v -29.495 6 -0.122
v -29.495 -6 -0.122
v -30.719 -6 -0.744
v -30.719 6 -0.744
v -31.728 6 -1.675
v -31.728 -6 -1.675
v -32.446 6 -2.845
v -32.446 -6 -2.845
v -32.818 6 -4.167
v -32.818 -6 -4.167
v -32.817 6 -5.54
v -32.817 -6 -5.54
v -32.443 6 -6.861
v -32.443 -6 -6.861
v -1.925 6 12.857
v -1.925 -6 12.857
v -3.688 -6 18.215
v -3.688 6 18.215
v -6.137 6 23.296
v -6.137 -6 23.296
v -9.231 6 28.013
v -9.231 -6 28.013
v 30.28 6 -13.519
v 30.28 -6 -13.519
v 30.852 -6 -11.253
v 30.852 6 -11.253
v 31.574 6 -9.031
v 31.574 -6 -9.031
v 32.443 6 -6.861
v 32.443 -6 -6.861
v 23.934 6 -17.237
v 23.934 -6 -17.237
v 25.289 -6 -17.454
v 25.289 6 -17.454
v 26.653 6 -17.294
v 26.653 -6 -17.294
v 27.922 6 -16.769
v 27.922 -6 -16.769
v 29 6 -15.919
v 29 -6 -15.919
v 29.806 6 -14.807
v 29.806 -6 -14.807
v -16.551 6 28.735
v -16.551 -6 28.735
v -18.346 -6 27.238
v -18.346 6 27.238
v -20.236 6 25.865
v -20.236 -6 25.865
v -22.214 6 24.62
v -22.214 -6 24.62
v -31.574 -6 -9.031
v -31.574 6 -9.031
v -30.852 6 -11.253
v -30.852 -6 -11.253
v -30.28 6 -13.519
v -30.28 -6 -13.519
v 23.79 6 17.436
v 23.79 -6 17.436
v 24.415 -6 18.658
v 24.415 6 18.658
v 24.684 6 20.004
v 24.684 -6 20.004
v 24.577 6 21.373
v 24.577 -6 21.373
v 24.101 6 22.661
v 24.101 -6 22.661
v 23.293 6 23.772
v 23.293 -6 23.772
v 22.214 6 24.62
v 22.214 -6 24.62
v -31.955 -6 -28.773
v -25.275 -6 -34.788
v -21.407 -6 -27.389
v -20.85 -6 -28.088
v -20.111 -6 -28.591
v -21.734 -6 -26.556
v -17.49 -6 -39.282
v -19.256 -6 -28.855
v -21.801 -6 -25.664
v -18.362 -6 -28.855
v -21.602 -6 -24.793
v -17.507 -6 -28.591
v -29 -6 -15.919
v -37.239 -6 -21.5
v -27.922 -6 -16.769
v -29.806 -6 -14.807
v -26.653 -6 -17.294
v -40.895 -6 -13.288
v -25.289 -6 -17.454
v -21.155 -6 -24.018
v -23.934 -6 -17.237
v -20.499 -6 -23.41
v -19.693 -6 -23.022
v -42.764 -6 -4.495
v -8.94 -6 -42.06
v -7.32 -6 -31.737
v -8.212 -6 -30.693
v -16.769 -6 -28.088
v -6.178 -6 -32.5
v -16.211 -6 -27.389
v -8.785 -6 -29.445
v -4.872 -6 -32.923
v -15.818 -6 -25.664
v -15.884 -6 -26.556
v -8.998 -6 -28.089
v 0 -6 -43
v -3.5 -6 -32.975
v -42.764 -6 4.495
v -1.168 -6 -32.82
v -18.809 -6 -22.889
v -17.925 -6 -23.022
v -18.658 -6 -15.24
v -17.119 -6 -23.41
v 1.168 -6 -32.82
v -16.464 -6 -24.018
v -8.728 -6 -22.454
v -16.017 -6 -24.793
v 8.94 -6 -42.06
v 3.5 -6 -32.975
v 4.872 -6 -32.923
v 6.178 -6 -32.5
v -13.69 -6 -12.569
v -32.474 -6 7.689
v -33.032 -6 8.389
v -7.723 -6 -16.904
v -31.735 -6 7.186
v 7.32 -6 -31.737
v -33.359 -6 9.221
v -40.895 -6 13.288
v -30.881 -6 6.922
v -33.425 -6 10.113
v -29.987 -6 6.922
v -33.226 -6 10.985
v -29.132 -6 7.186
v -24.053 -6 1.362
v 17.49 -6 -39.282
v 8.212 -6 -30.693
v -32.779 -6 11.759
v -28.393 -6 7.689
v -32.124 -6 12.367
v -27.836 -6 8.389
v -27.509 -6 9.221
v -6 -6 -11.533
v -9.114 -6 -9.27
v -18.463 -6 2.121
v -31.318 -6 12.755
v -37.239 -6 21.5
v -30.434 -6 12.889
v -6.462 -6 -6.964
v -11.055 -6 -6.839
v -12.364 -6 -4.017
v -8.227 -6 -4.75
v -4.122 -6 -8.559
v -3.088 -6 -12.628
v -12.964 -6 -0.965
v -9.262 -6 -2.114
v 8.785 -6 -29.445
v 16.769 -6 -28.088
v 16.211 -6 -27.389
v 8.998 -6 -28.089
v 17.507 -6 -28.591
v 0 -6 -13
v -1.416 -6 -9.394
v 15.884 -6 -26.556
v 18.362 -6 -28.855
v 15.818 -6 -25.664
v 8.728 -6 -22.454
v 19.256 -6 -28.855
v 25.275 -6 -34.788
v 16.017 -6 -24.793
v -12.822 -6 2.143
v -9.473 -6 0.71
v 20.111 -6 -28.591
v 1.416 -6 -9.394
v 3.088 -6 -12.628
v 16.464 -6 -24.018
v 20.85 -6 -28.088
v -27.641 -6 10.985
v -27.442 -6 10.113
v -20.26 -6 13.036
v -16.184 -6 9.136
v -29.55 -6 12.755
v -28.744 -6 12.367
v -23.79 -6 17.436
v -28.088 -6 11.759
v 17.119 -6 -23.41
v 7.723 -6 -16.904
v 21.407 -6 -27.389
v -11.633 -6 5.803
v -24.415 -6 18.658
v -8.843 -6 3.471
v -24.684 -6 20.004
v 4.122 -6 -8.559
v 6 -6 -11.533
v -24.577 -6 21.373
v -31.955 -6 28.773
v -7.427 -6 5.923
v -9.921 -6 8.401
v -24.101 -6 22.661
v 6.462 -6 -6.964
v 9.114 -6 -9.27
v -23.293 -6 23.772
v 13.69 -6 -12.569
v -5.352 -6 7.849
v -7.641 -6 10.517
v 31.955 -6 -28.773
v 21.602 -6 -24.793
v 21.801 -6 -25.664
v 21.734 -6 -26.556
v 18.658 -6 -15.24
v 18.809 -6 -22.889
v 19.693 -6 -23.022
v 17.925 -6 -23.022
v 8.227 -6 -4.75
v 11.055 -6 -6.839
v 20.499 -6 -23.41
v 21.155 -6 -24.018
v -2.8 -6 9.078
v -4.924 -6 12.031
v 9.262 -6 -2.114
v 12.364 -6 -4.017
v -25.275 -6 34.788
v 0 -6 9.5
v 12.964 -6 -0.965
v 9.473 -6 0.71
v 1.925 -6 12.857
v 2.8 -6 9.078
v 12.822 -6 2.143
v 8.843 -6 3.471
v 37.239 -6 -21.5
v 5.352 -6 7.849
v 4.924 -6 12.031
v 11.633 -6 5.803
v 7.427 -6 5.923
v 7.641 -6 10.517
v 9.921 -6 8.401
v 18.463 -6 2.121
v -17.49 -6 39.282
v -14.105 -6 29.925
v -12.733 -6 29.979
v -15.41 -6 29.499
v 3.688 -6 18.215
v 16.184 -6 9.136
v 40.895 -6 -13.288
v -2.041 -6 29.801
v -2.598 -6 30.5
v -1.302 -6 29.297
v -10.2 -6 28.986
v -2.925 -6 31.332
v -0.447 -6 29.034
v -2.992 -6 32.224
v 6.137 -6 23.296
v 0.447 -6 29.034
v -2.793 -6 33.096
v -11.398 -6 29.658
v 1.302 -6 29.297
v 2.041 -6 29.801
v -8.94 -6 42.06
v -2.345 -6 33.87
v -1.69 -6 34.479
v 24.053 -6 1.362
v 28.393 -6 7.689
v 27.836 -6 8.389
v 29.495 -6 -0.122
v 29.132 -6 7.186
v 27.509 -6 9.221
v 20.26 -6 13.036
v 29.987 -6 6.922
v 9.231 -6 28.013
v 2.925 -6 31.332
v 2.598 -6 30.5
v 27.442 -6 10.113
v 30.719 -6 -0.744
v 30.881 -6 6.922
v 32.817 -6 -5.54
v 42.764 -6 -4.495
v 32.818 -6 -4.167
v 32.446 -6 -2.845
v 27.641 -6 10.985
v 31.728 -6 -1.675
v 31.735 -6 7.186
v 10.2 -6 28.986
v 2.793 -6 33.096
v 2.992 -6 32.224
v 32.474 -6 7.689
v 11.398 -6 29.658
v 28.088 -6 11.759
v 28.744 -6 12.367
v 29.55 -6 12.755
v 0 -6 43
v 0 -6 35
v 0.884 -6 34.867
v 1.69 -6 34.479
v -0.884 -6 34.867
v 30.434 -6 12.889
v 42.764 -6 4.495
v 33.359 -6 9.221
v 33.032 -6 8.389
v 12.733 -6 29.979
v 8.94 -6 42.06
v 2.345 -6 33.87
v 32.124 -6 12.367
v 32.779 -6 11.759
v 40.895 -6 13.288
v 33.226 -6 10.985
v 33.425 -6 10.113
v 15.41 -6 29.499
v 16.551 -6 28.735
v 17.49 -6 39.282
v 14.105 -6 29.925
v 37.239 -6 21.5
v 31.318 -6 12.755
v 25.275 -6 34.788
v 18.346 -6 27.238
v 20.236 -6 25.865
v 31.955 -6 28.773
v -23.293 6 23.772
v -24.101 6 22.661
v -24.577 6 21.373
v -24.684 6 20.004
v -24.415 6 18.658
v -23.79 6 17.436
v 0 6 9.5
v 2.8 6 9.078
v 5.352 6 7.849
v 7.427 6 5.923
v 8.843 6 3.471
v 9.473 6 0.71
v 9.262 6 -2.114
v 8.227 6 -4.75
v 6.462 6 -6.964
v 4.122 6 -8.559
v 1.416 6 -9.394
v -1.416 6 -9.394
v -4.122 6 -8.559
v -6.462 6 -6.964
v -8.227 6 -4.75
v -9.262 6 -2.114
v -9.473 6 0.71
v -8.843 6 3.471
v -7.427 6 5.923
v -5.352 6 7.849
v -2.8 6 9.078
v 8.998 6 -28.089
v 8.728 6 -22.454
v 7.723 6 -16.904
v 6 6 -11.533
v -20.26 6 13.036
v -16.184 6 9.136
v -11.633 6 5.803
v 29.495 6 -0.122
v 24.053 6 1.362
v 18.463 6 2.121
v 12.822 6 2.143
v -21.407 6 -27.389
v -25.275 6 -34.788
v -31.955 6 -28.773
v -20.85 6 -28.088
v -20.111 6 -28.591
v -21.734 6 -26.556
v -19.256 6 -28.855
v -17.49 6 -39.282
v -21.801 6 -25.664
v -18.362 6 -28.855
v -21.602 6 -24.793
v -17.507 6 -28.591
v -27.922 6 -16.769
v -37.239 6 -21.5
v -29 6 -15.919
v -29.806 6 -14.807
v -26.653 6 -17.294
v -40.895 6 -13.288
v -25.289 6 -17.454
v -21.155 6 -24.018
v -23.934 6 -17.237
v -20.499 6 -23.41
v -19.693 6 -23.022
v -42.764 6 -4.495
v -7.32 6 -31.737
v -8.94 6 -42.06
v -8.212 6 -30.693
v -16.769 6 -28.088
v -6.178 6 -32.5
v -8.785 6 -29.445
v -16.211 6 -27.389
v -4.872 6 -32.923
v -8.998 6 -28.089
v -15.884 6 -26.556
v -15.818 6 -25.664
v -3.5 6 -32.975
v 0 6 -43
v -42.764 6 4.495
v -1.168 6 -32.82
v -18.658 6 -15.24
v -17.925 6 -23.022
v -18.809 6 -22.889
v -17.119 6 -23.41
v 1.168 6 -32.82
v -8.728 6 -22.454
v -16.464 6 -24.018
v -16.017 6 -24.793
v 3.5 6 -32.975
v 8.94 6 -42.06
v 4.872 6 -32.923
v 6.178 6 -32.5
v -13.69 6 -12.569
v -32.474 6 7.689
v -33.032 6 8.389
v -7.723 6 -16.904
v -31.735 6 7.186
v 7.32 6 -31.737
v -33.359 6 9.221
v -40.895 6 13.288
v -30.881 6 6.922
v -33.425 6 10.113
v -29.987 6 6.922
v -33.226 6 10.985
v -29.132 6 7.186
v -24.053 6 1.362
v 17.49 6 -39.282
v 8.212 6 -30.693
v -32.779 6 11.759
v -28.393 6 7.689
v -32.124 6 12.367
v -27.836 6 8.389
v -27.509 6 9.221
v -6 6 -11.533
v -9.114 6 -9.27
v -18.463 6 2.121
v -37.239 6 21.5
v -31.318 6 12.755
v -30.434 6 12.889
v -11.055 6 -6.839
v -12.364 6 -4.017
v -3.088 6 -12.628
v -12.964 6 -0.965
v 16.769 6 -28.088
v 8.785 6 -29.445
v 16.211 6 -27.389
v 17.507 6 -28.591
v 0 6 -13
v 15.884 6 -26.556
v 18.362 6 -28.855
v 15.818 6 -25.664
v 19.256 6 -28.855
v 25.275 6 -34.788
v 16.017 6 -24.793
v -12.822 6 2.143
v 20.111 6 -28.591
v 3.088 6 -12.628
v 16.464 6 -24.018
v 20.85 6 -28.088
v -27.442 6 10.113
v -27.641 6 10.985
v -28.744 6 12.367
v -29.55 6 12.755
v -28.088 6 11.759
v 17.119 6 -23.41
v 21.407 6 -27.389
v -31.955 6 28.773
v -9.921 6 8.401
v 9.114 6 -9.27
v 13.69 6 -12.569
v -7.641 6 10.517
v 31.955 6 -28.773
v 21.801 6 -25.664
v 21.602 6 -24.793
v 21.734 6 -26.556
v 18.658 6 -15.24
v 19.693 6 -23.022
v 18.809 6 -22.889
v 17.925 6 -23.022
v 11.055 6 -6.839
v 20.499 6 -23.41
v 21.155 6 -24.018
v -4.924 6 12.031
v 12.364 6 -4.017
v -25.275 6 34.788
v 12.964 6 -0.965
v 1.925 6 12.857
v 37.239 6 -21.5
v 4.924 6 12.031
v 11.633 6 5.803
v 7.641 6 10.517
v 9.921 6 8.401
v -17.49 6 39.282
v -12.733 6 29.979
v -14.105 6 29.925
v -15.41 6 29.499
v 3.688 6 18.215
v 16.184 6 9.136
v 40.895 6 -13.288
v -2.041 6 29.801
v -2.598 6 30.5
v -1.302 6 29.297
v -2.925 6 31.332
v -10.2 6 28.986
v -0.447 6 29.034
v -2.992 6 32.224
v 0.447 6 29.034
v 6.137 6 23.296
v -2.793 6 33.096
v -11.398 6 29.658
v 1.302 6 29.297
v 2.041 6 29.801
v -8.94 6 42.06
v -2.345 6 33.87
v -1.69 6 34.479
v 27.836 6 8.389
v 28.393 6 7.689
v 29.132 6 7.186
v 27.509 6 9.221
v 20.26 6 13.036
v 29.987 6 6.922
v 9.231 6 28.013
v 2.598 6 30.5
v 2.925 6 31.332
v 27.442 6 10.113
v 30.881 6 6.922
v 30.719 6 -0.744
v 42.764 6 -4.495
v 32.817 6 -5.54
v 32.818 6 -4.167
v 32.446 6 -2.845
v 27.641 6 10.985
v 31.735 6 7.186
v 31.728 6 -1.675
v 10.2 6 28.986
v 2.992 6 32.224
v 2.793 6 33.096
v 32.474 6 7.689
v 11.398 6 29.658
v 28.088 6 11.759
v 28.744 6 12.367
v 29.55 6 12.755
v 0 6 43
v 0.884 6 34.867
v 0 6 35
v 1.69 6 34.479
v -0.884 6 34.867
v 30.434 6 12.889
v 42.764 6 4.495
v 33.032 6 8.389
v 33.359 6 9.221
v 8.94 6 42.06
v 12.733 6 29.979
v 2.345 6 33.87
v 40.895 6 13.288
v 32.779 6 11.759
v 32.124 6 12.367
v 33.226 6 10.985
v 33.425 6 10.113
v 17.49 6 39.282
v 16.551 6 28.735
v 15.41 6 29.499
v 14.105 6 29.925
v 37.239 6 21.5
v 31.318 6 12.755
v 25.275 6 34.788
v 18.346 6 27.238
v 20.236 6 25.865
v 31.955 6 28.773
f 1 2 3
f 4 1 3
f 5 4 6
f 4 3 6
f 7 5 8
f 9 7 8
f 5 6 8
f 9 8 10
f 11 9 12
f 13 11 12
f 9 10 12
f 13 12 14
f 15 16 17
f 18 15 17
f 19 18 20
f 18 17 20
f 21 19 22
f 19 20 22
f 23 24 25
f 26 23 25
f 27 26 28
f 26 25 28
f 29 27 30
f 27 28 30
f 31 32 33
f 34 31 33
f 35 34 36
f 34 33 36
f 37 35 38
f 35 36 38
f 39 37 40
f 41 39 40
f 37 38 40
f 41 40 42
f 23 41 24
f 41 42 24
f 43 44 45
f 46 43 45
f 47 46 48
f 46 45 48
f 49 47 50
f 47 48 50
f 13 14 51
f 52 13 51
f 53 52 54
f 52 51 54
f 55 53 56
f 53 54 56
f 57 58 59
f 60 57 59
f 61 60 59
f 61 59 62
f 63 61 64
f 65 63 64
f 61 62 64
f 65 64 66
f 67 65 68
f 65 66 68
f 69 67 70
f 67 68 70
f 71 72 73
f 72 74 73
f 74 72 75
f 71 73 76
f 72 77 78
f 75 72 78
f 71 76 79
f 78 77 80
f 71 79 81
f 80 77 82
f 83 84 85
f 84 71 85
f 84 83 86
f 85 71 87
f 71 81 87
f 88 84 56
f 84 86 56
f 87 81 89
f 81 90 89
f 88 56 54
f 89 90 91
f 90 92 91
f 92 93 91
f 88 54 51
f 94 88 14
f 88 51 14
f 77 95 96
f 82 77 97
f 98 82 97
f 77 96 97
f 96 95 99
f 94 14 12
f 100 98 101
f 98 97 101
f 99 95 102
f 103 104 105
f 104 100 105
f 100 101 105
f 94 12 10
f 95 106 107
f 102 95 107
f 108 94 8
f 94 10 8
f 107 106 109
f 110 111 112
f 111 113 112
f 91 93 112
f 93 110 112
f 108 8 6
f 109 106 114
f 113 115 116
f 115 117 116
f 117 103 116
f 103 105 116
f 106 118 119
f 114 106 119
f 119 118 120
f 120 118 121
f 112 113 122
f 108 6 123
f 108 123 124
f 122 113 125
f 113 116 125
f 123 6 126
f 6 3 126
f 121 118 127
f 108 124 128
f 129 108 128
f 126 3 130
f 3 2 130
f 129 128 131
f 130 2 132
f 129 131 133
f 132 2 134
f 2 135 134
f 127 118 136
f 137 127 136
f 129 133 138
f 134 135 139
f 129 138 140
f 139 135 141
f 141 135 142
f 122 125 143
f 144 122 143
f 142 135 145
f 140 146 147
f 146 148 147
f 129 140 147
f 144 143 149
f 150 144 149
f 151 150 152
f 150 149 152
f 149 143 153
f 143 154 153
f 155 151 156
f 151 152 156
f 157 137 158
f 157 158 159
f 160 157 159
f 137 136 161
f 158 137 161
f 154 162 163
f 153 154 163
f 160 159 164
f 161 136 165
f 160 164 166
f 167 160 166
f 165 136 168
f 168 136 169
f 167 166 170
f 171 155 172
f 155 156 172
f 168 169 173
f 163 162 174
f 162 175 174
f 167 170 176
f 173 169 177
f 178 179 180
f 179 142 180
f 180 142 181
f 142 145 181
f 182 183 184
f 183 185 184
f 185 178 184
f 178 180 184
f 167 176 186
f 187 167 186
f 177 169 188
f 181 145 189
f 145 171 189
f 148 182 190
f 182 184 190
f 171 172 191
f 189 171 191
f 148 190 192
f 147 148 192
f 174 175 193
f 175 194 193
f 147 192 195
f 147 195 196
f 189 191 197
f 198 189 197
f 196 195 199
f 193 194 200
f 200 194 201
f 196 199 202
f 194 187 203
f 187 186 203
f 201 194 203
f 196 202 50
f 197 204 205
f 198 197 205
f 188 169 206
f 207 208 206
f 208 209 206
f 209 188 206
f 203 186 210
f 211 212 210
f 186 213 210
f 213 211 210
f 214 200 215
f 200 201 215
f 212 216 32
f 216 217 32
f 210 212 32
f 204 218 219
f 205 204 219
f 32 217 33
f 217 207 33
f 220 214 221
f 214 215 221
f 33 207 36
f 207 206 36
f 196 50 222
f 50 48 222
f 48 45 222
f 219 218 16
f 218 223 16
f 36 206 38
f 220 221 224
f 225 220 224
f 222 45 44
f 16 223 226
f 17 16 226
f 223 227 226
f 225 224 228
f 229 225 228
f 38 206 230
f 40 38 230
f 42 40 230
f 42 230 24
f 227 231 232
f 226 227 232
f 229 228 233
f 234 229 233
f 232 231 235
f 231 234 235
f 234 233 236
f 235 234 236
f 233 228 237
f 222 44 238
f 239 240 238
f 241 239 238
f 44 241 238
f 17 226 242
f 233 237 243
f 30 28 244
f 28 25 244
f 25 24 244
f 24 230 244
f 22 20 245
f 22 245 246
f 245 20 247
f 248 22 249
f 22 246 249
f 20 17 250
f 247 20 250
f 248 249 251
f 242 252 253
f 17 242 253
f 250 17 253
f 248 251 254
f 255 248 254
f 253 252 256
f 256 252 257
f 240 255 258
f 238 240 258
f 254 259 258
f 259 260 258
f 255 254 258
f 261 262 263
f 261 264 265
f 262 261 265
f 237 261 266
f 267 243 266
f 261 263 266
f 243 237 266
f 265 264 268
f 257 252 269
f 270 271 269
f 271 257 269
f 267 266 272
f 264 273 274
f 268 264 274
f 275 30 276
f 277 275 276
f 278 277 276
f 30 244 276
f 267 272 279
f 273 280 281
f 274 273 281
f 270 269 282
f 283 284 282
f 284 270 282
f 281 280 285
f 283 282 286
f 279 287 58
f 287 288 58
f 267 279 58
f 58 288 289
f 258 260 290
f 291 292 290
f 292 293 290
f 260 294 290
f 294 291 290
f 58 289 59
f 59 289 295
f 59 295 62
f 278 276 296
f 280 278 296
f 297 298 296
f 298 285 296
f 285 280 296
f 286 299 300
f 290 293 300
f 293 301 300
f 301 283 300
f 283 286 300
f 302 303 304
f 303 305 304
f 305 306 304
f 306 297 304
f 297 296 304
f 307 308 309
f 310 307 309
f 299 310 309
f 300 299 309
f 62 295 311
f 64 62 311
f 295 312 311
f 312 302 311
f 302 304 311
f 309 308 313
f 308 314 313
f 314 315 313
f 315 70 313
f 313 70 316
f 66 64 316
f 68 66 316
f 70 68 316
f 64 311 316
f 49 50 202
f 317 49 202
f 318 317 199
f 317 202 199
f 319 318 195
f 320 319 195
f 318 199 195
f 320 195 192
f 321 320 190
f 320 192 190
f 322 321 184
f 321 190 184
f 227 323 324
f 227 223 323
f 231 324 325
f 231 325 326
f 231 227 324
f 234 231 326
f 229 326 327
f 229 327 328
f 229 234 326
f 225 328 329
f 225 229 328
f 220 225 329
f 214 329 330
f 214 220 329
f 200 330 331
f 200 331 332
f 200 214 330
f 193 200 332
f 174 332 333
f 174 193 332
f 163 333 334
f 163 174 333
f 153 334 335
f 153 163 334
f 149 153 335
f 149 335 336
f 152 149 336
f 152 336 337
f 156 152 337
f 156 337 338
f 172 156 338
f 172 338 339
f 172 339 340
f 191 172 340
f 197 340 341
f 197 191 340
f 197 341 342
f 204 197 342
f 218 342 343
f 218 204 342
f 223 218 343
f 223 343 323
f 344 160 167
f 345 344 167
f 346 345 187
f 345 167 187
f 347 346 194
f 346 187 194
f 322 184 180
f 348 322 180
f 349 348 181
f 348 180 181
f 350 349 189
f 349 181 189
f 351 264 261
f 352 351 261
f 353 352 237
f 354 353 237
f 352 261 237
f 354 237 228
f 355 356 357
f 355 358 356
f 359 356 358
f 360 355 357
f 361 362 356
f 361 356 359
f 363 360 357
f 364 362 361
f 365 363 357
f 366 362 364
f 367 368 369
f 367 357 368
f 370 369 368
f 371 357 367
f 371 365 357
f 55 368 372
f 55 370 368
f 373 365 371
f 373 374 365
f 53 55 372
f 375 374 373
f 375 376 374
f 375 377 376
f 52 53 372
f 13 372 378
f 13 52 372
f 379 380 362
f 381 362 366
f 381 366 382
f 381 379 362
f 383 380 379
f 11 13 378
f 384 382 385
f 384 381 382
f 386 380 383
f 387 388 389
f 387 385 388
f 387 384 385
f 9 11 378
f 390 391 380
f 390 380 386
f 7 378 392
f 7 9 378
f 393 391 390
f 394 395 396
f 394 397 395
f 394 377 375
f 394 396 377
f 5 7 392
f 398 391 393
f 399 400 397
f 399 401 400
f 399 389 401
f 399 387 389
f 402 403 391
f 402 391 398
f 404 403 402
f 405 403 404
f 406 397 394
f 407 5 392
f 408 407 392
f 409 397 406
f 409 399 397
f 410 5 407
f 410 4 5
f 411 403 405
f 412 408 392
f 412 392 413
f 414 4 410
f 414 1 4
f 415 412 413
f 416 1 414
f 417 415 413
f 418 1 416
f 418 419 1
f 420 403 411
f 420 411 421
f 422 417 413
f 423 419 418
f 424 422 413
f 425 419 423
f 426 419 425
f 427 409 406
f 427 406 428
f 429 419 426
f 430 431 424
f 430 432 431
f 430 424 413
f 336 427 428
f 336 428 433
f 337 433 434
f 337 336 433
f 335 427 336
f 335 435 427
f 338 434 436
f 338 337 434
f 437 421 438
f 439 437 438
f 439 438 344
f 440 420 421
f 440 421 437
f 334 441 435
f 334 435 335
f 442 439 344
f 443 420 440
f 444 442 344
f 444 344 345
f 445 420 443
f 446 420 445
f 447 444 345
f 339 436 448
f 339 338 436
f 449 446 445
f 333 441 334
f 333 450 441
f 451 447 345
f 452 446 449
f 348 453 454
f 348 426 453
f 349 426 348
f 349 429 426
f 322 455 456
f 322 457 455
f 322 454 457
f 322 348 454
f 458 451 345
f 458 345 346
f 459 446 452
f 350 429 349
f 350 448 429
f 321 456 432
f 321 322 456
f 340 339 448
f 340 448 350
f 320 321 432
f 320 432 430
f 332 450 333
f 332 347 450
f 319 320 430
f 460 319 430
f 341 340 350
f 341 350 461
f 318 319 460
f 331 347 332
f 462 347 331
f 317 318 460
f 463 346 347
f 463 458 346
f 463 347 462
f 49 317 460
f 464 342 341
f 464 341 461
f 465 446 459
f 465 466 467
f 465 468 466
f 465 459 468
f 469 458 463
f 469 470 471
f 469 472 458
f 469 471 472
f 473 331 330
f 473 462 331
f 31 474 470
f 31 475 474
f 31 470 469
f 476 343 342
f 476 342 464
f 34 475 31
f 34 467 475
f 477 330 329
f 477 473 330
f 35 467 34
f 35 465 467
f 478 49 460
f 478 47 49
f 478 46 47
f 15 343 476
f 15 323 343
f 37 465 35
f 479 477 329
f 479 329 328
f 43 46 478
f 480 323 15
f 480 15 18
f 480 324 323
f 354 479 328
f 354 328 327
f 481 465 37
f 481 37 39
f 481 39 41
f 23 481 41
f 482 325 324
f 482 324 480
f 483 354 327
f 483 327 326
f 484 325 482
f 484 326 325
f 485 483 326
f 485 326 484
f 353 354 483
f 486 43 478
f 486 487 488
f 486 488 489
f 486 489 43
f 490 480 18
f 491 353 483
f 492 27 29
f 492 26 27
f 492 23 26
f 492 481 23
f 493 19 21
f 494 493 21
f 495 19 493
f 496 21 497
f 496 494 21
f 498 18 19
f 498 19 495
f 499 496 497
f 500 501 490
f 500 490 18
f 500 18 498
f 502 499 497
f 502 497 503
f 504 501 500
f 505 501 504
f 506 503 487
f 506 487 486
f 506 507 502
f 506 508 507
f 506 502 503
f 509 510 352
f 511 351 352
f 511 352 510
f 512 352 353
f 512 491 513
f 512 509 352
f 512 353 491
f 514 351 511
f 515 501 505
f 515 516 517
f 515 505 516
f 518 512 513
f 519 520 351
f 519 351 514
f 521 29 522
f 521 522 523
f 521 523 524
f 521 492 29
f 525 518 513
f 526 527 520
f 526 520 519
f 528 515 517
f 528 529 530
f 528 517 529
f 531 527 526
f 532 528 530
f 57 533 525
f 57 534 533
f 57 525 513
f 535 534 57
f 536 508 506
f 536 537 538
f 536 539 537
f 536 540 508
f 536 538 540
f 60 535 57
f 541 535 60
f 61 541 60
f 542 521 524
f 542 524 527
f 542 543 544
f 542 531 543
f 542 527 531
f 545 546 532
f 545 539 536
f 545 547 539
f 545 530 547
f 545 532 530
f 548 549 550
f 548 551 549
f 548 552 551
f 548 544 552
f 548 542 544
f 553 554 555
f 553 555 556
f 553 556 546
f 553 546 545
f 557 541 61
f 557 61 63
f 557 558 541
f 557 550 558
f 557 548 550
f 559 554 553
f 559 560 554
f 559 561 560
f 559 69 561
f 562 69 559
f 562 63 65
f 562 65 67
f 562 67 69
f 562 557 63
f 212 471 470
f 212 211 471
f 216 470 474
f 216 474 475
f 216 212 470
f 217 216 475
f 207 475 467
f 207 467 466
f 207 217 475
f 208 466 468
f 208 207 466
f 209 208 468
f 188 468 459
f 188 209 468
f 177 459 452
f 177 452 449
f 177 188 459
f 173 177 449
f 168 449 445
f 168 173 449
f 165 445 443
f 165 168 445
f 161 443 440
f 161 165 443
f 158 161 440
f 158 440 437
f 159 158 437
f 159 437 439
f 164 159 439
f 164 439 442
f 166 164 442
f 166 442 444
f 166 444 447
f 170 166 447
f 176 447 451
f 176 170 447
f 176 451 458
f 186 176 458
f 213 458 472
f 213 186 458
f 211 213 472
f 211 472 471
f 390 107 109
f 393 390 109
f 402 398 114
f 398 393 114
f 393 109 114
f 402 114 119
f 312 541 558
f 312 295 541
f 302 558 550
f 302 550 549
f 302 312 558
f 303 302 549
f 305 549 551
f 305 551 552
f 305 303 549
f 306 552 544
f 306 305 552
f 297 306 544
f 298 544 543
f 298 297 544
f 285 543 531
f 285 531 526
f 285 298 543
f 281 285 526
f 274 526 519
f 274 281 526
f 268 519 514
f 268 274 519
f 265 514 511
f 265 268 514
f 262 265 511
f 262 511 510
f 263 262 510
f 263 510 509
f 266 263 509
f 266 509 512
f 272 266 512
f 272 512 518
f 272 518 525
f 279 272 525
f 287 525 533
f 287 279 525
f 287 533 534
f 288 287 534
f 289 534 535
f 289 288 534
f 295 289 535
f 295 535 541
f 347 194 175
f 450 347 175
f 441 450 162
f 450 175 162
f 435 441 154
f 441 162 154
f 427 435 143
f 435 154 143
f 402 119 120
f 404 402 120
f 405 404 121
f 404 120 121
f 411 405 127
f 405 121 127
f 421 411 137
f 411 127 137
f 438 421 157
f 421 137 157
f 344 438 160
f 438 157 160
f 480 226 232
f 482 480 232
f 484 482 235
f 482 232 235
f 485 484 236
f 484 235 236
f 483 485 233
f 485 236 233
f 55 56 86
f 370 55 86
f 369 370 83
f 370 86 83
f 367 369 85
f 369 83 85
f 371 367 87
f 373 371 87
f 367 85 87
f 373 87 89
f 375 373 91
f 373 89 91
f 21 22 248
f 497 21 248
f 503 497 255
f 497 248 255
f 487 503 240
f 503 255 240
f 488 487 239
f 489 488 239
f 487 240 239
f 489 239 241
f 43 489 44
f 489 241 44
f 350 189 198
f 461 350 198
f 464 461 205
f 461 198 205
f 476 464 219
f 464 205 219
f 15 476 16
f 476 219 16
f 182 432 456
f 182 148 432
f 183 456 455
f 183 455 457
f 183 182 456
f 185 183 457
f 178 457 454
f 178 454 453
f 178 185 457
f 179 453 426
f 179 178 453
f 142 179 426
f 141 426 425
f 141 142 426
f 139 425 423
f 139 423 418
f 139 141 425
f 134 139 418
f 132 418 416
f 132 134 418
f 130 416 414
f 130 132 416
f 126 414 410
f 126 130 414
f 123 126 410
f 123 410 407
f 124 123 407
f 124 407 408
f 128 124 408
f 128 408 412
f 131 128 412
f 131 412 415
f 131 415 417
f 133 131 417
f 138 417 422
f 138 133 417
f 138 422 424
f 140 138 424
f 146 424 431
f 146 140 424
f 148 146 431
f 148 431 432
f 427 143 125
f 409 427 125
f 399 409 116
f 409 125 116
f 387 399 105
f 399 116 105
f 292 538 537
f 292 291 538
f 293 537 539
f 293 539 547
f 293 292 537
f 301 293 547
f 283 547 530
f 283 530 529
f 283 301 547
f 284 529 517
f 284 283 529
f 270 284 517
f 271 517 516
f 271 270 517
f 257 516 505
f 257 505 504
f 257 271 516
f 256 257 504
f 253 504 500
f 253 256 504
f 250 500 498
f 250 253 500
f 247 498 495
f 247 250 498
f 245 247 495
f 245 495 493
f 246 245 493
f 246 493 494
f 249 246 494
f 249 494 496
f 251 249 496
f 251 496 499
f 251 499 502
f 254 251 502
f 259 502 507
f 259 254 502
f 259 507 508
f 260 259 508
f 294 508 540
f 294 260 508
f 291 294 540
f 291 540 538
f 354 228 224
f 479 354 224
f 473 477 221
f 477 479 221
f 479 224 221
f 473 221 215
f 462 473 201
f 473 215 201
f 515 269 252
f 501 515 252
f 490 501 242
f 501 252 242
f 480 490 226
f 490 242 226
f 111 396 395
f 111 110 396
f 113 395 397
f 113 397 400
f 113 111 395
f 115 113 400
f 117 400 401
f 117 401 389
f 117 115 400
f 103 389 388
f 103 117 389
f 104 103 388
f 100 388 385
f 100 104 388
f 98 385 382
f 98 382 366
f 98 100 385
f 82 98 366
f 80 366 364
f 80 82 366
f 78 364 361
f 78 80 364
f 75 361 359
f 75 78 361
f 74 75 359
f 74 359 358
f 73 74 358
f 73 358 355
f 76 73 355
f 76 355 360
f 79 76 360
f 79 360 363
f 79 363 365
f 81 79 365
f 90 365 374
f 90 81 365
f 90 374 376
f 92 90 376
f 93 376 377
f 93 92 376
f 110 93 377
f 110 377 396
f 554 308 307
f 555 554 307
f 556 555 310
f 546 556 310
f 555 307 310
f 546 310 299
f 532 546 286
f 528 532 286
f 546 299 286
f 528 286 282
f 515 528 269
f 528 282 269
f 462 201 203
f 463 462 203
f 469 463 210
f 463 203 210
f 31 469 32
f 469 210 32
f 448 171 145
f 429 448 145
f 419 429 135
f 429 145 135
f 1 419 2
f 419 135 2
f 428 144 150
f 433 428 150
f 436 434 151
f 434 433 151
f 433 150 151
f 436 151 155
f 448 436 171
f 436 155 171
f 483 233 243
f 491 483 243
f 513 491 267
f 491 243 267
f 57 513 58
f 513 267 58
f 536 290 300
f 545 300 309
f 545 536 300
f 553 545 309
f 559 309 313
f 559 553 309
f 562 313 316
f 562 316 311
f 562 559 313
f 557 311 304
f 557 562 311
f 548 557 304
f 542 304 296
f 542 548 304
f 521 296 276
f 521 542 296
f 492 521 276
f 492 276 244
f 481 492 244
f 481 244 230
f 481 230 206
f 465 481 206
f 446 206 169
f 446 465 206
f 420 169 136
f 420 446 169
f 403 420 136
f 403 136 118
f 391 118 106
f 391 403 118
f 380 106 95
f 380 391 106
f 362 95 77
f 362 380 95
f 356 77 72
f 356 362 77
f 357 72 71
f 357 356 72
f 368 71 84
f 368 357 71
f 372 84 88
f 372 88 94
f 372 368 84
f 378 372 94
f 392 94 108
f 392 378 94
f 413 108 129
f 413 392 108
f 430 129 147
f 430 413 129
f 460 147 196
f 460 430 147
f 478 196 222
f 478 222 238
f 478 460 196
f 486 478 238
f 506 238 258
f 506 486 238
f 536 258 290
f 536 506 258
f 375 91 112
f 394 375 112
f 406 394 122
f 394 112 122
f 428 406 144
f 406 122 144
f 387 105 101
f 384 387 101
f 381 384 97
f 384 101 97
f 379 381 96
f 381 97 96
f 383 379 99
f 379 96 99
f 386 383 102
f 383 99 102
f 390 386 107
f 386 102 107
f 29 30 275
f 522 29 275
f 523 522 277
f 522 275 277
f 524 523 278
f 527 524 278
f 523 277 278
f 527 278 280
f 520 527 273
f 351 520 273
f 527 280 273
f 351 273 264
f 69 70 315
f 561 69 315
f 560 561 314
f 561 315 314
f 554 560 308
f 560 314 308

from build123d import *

# Parameters (mm, degrees)
SKETCH1_R               = 43
SKETCH1_R_2             = 9.5
SKETCH1_R_3             = 3
BOSS_EXTRUDE1_DEPTH     = 6
CUT_EXTRUDE1_DEPTH      = 62.983868869
CUT_EXTRUDE1_DEPTH_BACK = 62.983868869


with BuildPart() as part:
    # Sketch1 → Boss-Extrude1 (new, symmetric)
    with BuildSketch(Plane(origin=(0, 0, 0), x_dir=(1, 0, 0), z_dir=(0, 1, 0))):
        with Locations(Location((0, 0, 0), (0, 0, 270))):
            Circle(SKETCH1_R)
        with Locations(Location((0, 0, 0), (0, 0, 270))):
            Circle(SKETCH1_R_2, mode=Mode.SUBTRACT)
        with Locations(Location((0, -32, 0), (0, 0, 270))):
            Circle(SKETCH1_R_3, mode=Mode.SUBTRACT)
        with Locations(Location((-30.433808521, -9.88854382, 0), (0, 0, 270))):
            Circle(SKETCH1_R_3, mode=Mode.SUBTRACT)
        with Locations(Location((-18.809128073, 25.88854382, 0), (0, 0, 270))):
            Circle(SKETCH1_R_3, mode=Mode.SUBTRACT)
        with Locations(Location((18.809128073, 25.88854382, 0), (0, 0, 270))):
            Circle(SKETCH1_R_3, mode=Mode.SUBTRACT)
        with Locations(Location((30.433808521, -9.88854382, 0), (0, 0, 270))):
            Circle(SKETCH1_R_3, mode=Mode.SUBTRACT)
    extrude(amount=BOSS_EXTRUDE1_DEPTH, both=True)

    # Sketch2 → Cut-Extrude1 (cut, two sides: drawn at the far end of the back side and taken through both)
    with BuildSketch(Plane(origin=(0, 6, 0), x_dir=(1, 0, 0), z_dir=(0, 1, 0)).offset(-CUT_EXTRUDE1_DEPTH_BACK)):
        with BuildLine():
            ThreePointArc((-9.114016839, 9.270096928), (-12.363734712, 4.017220927), (-12.822220771, -2.142581267))
            ThreePointArc((-12.822220771, -2.142581267), (-21.270303496, -1.833512485), (-29.494654795, 0.122419764))
            ThreePointArc((-29.494654795, 0.122419764), (-32.446074444, 2.845461233), (-32.44271131, 6.861158119))
            ThreePointArc((-32.44271131, 6.861158119), (-31.194730701, 10.135782424), (-30.27959235, 13.518553733))
            ThreePointArc((-30.27959235, 13.518553733), (-27.921945775, 16.769297559), (-23.933633504, 17.23748344))
            ThreePointArc((-23.933633504, 17.23748344), (-16.130325405, 13.985713467), (-9.114016839, 9.270096928))
        make_face()
        with BuildLine():
            ThreePointArc((6, 11.532562595), (0, 13), (-6, 11.532562595))
            ThreePointArc((-6, 11.532562595), (-8.316659253, 19.662674227), (-8.99792146, 28.088913426))
            ThreePointArc((-8.99792146, 28.088913426), (-7.320193957, 31.737346406), (-3.5, 32.975066458))
            ThreePointArc((-3.5, 32.975066458), (0, 32.800080928), (3.5, 32.975066458))
            ThreePointArc((3.5, 32.975066458), (7.320193957, 31.737346406), (8.99792146, 28.088913426))
            ThreePointArc((8.99792146, 28.088913426), (8.316659253, 19.662674227), (6, 11.532562595))
        make_face()
        with BuildLine():
            ThreePointArc((12.822220771, -2.142581267), (12.363734712, 4.017220927), (9.114016839, 9.270096928))
            ThreePointArc((9.114016839, 9.270096928), (16.130325405, 13.985713467), (23.933633504, 17.23748344))
            ThreePointArc((23.933633504, 17.23748344), (27.921945775, 16.769297559), (30.27959235, 13.518553733))
            ThreePointArc((30.27959235, 13.518553733), (31.194730701, 10.135782424), (32.44271131, 6.861158119))
            ThreePointArc((32.44271131, 6.861158119), (32.446074444, 2.845461233), (29.494654795, 0.122419764))
            ThreePointArc((29.494654795, 0.122419764), (21.270303496, -1.833512485), (12.822220771, -2.142581267))
        make_face()
        with BuildLine():
            ThreePointArc((-1.924568248, -12.856750642), (-4.829111259, -20.795847261), (-9.230777689, -28.013253851))
            ThreePointArc((-9.230777689, -28.013253851), (-12.732582852, -29.978754651), (-16.550698277, -28.734637538))
            ThreePointArc((-16.550698277, -28.734637538), (-19.279403843, -26.535822888), (-22.213817238, -24.620140772))
            ThreePointArc((-22.213817238, -24.620140772), (-24.576905478, -21.373350548), (-23.78972044, -17.435562779))
            ThreePointArc((-23.78972044, -17.435562779), (-18.285748603, -11.019027947), (-11.632772181, -5.803327614))
            ThreePointArc((-11.632772181, -5.803327614), (-7.64120828, -10.517220927), (-1.924568248, -12.856750642))
        make_face()
        with BuildLine():
            ThreePointArc((1.924568248, -12.856750642), (7.64120828, -10.517220927), (11.632772181, -5.803327614))
            ThreePointArc((11.632772181, -5.803327614), (18.285748603, -11.019027947), (23.78972044, -17.435562779))
            ThreePointArc((23.78972044, -17.435562779), (24.576905478, -21.373350548), (22.213817238, -24.620140772))
            ThreePointArc((22.213817238, -24.620140772), (19.279403843, -26.535822888), (16.550698277, -28.734637538))
            ThreePointArc((16.550698277, -28.734637538), (12.732582852, -29.978754651), (9.230777689, -28.013253851))
            ThreePointArc((9.230777689, -28.013253851), (4.829111259, -20.795847261), (1.924568248, -12.856750642))
        make_face()
    extrude(amount=CUT_EXTRUDE1_DEPTH + CUT_EXTRUDE1_DEPTH_BACK, mode=Mode.SUBTRACT)


solid = part.part
